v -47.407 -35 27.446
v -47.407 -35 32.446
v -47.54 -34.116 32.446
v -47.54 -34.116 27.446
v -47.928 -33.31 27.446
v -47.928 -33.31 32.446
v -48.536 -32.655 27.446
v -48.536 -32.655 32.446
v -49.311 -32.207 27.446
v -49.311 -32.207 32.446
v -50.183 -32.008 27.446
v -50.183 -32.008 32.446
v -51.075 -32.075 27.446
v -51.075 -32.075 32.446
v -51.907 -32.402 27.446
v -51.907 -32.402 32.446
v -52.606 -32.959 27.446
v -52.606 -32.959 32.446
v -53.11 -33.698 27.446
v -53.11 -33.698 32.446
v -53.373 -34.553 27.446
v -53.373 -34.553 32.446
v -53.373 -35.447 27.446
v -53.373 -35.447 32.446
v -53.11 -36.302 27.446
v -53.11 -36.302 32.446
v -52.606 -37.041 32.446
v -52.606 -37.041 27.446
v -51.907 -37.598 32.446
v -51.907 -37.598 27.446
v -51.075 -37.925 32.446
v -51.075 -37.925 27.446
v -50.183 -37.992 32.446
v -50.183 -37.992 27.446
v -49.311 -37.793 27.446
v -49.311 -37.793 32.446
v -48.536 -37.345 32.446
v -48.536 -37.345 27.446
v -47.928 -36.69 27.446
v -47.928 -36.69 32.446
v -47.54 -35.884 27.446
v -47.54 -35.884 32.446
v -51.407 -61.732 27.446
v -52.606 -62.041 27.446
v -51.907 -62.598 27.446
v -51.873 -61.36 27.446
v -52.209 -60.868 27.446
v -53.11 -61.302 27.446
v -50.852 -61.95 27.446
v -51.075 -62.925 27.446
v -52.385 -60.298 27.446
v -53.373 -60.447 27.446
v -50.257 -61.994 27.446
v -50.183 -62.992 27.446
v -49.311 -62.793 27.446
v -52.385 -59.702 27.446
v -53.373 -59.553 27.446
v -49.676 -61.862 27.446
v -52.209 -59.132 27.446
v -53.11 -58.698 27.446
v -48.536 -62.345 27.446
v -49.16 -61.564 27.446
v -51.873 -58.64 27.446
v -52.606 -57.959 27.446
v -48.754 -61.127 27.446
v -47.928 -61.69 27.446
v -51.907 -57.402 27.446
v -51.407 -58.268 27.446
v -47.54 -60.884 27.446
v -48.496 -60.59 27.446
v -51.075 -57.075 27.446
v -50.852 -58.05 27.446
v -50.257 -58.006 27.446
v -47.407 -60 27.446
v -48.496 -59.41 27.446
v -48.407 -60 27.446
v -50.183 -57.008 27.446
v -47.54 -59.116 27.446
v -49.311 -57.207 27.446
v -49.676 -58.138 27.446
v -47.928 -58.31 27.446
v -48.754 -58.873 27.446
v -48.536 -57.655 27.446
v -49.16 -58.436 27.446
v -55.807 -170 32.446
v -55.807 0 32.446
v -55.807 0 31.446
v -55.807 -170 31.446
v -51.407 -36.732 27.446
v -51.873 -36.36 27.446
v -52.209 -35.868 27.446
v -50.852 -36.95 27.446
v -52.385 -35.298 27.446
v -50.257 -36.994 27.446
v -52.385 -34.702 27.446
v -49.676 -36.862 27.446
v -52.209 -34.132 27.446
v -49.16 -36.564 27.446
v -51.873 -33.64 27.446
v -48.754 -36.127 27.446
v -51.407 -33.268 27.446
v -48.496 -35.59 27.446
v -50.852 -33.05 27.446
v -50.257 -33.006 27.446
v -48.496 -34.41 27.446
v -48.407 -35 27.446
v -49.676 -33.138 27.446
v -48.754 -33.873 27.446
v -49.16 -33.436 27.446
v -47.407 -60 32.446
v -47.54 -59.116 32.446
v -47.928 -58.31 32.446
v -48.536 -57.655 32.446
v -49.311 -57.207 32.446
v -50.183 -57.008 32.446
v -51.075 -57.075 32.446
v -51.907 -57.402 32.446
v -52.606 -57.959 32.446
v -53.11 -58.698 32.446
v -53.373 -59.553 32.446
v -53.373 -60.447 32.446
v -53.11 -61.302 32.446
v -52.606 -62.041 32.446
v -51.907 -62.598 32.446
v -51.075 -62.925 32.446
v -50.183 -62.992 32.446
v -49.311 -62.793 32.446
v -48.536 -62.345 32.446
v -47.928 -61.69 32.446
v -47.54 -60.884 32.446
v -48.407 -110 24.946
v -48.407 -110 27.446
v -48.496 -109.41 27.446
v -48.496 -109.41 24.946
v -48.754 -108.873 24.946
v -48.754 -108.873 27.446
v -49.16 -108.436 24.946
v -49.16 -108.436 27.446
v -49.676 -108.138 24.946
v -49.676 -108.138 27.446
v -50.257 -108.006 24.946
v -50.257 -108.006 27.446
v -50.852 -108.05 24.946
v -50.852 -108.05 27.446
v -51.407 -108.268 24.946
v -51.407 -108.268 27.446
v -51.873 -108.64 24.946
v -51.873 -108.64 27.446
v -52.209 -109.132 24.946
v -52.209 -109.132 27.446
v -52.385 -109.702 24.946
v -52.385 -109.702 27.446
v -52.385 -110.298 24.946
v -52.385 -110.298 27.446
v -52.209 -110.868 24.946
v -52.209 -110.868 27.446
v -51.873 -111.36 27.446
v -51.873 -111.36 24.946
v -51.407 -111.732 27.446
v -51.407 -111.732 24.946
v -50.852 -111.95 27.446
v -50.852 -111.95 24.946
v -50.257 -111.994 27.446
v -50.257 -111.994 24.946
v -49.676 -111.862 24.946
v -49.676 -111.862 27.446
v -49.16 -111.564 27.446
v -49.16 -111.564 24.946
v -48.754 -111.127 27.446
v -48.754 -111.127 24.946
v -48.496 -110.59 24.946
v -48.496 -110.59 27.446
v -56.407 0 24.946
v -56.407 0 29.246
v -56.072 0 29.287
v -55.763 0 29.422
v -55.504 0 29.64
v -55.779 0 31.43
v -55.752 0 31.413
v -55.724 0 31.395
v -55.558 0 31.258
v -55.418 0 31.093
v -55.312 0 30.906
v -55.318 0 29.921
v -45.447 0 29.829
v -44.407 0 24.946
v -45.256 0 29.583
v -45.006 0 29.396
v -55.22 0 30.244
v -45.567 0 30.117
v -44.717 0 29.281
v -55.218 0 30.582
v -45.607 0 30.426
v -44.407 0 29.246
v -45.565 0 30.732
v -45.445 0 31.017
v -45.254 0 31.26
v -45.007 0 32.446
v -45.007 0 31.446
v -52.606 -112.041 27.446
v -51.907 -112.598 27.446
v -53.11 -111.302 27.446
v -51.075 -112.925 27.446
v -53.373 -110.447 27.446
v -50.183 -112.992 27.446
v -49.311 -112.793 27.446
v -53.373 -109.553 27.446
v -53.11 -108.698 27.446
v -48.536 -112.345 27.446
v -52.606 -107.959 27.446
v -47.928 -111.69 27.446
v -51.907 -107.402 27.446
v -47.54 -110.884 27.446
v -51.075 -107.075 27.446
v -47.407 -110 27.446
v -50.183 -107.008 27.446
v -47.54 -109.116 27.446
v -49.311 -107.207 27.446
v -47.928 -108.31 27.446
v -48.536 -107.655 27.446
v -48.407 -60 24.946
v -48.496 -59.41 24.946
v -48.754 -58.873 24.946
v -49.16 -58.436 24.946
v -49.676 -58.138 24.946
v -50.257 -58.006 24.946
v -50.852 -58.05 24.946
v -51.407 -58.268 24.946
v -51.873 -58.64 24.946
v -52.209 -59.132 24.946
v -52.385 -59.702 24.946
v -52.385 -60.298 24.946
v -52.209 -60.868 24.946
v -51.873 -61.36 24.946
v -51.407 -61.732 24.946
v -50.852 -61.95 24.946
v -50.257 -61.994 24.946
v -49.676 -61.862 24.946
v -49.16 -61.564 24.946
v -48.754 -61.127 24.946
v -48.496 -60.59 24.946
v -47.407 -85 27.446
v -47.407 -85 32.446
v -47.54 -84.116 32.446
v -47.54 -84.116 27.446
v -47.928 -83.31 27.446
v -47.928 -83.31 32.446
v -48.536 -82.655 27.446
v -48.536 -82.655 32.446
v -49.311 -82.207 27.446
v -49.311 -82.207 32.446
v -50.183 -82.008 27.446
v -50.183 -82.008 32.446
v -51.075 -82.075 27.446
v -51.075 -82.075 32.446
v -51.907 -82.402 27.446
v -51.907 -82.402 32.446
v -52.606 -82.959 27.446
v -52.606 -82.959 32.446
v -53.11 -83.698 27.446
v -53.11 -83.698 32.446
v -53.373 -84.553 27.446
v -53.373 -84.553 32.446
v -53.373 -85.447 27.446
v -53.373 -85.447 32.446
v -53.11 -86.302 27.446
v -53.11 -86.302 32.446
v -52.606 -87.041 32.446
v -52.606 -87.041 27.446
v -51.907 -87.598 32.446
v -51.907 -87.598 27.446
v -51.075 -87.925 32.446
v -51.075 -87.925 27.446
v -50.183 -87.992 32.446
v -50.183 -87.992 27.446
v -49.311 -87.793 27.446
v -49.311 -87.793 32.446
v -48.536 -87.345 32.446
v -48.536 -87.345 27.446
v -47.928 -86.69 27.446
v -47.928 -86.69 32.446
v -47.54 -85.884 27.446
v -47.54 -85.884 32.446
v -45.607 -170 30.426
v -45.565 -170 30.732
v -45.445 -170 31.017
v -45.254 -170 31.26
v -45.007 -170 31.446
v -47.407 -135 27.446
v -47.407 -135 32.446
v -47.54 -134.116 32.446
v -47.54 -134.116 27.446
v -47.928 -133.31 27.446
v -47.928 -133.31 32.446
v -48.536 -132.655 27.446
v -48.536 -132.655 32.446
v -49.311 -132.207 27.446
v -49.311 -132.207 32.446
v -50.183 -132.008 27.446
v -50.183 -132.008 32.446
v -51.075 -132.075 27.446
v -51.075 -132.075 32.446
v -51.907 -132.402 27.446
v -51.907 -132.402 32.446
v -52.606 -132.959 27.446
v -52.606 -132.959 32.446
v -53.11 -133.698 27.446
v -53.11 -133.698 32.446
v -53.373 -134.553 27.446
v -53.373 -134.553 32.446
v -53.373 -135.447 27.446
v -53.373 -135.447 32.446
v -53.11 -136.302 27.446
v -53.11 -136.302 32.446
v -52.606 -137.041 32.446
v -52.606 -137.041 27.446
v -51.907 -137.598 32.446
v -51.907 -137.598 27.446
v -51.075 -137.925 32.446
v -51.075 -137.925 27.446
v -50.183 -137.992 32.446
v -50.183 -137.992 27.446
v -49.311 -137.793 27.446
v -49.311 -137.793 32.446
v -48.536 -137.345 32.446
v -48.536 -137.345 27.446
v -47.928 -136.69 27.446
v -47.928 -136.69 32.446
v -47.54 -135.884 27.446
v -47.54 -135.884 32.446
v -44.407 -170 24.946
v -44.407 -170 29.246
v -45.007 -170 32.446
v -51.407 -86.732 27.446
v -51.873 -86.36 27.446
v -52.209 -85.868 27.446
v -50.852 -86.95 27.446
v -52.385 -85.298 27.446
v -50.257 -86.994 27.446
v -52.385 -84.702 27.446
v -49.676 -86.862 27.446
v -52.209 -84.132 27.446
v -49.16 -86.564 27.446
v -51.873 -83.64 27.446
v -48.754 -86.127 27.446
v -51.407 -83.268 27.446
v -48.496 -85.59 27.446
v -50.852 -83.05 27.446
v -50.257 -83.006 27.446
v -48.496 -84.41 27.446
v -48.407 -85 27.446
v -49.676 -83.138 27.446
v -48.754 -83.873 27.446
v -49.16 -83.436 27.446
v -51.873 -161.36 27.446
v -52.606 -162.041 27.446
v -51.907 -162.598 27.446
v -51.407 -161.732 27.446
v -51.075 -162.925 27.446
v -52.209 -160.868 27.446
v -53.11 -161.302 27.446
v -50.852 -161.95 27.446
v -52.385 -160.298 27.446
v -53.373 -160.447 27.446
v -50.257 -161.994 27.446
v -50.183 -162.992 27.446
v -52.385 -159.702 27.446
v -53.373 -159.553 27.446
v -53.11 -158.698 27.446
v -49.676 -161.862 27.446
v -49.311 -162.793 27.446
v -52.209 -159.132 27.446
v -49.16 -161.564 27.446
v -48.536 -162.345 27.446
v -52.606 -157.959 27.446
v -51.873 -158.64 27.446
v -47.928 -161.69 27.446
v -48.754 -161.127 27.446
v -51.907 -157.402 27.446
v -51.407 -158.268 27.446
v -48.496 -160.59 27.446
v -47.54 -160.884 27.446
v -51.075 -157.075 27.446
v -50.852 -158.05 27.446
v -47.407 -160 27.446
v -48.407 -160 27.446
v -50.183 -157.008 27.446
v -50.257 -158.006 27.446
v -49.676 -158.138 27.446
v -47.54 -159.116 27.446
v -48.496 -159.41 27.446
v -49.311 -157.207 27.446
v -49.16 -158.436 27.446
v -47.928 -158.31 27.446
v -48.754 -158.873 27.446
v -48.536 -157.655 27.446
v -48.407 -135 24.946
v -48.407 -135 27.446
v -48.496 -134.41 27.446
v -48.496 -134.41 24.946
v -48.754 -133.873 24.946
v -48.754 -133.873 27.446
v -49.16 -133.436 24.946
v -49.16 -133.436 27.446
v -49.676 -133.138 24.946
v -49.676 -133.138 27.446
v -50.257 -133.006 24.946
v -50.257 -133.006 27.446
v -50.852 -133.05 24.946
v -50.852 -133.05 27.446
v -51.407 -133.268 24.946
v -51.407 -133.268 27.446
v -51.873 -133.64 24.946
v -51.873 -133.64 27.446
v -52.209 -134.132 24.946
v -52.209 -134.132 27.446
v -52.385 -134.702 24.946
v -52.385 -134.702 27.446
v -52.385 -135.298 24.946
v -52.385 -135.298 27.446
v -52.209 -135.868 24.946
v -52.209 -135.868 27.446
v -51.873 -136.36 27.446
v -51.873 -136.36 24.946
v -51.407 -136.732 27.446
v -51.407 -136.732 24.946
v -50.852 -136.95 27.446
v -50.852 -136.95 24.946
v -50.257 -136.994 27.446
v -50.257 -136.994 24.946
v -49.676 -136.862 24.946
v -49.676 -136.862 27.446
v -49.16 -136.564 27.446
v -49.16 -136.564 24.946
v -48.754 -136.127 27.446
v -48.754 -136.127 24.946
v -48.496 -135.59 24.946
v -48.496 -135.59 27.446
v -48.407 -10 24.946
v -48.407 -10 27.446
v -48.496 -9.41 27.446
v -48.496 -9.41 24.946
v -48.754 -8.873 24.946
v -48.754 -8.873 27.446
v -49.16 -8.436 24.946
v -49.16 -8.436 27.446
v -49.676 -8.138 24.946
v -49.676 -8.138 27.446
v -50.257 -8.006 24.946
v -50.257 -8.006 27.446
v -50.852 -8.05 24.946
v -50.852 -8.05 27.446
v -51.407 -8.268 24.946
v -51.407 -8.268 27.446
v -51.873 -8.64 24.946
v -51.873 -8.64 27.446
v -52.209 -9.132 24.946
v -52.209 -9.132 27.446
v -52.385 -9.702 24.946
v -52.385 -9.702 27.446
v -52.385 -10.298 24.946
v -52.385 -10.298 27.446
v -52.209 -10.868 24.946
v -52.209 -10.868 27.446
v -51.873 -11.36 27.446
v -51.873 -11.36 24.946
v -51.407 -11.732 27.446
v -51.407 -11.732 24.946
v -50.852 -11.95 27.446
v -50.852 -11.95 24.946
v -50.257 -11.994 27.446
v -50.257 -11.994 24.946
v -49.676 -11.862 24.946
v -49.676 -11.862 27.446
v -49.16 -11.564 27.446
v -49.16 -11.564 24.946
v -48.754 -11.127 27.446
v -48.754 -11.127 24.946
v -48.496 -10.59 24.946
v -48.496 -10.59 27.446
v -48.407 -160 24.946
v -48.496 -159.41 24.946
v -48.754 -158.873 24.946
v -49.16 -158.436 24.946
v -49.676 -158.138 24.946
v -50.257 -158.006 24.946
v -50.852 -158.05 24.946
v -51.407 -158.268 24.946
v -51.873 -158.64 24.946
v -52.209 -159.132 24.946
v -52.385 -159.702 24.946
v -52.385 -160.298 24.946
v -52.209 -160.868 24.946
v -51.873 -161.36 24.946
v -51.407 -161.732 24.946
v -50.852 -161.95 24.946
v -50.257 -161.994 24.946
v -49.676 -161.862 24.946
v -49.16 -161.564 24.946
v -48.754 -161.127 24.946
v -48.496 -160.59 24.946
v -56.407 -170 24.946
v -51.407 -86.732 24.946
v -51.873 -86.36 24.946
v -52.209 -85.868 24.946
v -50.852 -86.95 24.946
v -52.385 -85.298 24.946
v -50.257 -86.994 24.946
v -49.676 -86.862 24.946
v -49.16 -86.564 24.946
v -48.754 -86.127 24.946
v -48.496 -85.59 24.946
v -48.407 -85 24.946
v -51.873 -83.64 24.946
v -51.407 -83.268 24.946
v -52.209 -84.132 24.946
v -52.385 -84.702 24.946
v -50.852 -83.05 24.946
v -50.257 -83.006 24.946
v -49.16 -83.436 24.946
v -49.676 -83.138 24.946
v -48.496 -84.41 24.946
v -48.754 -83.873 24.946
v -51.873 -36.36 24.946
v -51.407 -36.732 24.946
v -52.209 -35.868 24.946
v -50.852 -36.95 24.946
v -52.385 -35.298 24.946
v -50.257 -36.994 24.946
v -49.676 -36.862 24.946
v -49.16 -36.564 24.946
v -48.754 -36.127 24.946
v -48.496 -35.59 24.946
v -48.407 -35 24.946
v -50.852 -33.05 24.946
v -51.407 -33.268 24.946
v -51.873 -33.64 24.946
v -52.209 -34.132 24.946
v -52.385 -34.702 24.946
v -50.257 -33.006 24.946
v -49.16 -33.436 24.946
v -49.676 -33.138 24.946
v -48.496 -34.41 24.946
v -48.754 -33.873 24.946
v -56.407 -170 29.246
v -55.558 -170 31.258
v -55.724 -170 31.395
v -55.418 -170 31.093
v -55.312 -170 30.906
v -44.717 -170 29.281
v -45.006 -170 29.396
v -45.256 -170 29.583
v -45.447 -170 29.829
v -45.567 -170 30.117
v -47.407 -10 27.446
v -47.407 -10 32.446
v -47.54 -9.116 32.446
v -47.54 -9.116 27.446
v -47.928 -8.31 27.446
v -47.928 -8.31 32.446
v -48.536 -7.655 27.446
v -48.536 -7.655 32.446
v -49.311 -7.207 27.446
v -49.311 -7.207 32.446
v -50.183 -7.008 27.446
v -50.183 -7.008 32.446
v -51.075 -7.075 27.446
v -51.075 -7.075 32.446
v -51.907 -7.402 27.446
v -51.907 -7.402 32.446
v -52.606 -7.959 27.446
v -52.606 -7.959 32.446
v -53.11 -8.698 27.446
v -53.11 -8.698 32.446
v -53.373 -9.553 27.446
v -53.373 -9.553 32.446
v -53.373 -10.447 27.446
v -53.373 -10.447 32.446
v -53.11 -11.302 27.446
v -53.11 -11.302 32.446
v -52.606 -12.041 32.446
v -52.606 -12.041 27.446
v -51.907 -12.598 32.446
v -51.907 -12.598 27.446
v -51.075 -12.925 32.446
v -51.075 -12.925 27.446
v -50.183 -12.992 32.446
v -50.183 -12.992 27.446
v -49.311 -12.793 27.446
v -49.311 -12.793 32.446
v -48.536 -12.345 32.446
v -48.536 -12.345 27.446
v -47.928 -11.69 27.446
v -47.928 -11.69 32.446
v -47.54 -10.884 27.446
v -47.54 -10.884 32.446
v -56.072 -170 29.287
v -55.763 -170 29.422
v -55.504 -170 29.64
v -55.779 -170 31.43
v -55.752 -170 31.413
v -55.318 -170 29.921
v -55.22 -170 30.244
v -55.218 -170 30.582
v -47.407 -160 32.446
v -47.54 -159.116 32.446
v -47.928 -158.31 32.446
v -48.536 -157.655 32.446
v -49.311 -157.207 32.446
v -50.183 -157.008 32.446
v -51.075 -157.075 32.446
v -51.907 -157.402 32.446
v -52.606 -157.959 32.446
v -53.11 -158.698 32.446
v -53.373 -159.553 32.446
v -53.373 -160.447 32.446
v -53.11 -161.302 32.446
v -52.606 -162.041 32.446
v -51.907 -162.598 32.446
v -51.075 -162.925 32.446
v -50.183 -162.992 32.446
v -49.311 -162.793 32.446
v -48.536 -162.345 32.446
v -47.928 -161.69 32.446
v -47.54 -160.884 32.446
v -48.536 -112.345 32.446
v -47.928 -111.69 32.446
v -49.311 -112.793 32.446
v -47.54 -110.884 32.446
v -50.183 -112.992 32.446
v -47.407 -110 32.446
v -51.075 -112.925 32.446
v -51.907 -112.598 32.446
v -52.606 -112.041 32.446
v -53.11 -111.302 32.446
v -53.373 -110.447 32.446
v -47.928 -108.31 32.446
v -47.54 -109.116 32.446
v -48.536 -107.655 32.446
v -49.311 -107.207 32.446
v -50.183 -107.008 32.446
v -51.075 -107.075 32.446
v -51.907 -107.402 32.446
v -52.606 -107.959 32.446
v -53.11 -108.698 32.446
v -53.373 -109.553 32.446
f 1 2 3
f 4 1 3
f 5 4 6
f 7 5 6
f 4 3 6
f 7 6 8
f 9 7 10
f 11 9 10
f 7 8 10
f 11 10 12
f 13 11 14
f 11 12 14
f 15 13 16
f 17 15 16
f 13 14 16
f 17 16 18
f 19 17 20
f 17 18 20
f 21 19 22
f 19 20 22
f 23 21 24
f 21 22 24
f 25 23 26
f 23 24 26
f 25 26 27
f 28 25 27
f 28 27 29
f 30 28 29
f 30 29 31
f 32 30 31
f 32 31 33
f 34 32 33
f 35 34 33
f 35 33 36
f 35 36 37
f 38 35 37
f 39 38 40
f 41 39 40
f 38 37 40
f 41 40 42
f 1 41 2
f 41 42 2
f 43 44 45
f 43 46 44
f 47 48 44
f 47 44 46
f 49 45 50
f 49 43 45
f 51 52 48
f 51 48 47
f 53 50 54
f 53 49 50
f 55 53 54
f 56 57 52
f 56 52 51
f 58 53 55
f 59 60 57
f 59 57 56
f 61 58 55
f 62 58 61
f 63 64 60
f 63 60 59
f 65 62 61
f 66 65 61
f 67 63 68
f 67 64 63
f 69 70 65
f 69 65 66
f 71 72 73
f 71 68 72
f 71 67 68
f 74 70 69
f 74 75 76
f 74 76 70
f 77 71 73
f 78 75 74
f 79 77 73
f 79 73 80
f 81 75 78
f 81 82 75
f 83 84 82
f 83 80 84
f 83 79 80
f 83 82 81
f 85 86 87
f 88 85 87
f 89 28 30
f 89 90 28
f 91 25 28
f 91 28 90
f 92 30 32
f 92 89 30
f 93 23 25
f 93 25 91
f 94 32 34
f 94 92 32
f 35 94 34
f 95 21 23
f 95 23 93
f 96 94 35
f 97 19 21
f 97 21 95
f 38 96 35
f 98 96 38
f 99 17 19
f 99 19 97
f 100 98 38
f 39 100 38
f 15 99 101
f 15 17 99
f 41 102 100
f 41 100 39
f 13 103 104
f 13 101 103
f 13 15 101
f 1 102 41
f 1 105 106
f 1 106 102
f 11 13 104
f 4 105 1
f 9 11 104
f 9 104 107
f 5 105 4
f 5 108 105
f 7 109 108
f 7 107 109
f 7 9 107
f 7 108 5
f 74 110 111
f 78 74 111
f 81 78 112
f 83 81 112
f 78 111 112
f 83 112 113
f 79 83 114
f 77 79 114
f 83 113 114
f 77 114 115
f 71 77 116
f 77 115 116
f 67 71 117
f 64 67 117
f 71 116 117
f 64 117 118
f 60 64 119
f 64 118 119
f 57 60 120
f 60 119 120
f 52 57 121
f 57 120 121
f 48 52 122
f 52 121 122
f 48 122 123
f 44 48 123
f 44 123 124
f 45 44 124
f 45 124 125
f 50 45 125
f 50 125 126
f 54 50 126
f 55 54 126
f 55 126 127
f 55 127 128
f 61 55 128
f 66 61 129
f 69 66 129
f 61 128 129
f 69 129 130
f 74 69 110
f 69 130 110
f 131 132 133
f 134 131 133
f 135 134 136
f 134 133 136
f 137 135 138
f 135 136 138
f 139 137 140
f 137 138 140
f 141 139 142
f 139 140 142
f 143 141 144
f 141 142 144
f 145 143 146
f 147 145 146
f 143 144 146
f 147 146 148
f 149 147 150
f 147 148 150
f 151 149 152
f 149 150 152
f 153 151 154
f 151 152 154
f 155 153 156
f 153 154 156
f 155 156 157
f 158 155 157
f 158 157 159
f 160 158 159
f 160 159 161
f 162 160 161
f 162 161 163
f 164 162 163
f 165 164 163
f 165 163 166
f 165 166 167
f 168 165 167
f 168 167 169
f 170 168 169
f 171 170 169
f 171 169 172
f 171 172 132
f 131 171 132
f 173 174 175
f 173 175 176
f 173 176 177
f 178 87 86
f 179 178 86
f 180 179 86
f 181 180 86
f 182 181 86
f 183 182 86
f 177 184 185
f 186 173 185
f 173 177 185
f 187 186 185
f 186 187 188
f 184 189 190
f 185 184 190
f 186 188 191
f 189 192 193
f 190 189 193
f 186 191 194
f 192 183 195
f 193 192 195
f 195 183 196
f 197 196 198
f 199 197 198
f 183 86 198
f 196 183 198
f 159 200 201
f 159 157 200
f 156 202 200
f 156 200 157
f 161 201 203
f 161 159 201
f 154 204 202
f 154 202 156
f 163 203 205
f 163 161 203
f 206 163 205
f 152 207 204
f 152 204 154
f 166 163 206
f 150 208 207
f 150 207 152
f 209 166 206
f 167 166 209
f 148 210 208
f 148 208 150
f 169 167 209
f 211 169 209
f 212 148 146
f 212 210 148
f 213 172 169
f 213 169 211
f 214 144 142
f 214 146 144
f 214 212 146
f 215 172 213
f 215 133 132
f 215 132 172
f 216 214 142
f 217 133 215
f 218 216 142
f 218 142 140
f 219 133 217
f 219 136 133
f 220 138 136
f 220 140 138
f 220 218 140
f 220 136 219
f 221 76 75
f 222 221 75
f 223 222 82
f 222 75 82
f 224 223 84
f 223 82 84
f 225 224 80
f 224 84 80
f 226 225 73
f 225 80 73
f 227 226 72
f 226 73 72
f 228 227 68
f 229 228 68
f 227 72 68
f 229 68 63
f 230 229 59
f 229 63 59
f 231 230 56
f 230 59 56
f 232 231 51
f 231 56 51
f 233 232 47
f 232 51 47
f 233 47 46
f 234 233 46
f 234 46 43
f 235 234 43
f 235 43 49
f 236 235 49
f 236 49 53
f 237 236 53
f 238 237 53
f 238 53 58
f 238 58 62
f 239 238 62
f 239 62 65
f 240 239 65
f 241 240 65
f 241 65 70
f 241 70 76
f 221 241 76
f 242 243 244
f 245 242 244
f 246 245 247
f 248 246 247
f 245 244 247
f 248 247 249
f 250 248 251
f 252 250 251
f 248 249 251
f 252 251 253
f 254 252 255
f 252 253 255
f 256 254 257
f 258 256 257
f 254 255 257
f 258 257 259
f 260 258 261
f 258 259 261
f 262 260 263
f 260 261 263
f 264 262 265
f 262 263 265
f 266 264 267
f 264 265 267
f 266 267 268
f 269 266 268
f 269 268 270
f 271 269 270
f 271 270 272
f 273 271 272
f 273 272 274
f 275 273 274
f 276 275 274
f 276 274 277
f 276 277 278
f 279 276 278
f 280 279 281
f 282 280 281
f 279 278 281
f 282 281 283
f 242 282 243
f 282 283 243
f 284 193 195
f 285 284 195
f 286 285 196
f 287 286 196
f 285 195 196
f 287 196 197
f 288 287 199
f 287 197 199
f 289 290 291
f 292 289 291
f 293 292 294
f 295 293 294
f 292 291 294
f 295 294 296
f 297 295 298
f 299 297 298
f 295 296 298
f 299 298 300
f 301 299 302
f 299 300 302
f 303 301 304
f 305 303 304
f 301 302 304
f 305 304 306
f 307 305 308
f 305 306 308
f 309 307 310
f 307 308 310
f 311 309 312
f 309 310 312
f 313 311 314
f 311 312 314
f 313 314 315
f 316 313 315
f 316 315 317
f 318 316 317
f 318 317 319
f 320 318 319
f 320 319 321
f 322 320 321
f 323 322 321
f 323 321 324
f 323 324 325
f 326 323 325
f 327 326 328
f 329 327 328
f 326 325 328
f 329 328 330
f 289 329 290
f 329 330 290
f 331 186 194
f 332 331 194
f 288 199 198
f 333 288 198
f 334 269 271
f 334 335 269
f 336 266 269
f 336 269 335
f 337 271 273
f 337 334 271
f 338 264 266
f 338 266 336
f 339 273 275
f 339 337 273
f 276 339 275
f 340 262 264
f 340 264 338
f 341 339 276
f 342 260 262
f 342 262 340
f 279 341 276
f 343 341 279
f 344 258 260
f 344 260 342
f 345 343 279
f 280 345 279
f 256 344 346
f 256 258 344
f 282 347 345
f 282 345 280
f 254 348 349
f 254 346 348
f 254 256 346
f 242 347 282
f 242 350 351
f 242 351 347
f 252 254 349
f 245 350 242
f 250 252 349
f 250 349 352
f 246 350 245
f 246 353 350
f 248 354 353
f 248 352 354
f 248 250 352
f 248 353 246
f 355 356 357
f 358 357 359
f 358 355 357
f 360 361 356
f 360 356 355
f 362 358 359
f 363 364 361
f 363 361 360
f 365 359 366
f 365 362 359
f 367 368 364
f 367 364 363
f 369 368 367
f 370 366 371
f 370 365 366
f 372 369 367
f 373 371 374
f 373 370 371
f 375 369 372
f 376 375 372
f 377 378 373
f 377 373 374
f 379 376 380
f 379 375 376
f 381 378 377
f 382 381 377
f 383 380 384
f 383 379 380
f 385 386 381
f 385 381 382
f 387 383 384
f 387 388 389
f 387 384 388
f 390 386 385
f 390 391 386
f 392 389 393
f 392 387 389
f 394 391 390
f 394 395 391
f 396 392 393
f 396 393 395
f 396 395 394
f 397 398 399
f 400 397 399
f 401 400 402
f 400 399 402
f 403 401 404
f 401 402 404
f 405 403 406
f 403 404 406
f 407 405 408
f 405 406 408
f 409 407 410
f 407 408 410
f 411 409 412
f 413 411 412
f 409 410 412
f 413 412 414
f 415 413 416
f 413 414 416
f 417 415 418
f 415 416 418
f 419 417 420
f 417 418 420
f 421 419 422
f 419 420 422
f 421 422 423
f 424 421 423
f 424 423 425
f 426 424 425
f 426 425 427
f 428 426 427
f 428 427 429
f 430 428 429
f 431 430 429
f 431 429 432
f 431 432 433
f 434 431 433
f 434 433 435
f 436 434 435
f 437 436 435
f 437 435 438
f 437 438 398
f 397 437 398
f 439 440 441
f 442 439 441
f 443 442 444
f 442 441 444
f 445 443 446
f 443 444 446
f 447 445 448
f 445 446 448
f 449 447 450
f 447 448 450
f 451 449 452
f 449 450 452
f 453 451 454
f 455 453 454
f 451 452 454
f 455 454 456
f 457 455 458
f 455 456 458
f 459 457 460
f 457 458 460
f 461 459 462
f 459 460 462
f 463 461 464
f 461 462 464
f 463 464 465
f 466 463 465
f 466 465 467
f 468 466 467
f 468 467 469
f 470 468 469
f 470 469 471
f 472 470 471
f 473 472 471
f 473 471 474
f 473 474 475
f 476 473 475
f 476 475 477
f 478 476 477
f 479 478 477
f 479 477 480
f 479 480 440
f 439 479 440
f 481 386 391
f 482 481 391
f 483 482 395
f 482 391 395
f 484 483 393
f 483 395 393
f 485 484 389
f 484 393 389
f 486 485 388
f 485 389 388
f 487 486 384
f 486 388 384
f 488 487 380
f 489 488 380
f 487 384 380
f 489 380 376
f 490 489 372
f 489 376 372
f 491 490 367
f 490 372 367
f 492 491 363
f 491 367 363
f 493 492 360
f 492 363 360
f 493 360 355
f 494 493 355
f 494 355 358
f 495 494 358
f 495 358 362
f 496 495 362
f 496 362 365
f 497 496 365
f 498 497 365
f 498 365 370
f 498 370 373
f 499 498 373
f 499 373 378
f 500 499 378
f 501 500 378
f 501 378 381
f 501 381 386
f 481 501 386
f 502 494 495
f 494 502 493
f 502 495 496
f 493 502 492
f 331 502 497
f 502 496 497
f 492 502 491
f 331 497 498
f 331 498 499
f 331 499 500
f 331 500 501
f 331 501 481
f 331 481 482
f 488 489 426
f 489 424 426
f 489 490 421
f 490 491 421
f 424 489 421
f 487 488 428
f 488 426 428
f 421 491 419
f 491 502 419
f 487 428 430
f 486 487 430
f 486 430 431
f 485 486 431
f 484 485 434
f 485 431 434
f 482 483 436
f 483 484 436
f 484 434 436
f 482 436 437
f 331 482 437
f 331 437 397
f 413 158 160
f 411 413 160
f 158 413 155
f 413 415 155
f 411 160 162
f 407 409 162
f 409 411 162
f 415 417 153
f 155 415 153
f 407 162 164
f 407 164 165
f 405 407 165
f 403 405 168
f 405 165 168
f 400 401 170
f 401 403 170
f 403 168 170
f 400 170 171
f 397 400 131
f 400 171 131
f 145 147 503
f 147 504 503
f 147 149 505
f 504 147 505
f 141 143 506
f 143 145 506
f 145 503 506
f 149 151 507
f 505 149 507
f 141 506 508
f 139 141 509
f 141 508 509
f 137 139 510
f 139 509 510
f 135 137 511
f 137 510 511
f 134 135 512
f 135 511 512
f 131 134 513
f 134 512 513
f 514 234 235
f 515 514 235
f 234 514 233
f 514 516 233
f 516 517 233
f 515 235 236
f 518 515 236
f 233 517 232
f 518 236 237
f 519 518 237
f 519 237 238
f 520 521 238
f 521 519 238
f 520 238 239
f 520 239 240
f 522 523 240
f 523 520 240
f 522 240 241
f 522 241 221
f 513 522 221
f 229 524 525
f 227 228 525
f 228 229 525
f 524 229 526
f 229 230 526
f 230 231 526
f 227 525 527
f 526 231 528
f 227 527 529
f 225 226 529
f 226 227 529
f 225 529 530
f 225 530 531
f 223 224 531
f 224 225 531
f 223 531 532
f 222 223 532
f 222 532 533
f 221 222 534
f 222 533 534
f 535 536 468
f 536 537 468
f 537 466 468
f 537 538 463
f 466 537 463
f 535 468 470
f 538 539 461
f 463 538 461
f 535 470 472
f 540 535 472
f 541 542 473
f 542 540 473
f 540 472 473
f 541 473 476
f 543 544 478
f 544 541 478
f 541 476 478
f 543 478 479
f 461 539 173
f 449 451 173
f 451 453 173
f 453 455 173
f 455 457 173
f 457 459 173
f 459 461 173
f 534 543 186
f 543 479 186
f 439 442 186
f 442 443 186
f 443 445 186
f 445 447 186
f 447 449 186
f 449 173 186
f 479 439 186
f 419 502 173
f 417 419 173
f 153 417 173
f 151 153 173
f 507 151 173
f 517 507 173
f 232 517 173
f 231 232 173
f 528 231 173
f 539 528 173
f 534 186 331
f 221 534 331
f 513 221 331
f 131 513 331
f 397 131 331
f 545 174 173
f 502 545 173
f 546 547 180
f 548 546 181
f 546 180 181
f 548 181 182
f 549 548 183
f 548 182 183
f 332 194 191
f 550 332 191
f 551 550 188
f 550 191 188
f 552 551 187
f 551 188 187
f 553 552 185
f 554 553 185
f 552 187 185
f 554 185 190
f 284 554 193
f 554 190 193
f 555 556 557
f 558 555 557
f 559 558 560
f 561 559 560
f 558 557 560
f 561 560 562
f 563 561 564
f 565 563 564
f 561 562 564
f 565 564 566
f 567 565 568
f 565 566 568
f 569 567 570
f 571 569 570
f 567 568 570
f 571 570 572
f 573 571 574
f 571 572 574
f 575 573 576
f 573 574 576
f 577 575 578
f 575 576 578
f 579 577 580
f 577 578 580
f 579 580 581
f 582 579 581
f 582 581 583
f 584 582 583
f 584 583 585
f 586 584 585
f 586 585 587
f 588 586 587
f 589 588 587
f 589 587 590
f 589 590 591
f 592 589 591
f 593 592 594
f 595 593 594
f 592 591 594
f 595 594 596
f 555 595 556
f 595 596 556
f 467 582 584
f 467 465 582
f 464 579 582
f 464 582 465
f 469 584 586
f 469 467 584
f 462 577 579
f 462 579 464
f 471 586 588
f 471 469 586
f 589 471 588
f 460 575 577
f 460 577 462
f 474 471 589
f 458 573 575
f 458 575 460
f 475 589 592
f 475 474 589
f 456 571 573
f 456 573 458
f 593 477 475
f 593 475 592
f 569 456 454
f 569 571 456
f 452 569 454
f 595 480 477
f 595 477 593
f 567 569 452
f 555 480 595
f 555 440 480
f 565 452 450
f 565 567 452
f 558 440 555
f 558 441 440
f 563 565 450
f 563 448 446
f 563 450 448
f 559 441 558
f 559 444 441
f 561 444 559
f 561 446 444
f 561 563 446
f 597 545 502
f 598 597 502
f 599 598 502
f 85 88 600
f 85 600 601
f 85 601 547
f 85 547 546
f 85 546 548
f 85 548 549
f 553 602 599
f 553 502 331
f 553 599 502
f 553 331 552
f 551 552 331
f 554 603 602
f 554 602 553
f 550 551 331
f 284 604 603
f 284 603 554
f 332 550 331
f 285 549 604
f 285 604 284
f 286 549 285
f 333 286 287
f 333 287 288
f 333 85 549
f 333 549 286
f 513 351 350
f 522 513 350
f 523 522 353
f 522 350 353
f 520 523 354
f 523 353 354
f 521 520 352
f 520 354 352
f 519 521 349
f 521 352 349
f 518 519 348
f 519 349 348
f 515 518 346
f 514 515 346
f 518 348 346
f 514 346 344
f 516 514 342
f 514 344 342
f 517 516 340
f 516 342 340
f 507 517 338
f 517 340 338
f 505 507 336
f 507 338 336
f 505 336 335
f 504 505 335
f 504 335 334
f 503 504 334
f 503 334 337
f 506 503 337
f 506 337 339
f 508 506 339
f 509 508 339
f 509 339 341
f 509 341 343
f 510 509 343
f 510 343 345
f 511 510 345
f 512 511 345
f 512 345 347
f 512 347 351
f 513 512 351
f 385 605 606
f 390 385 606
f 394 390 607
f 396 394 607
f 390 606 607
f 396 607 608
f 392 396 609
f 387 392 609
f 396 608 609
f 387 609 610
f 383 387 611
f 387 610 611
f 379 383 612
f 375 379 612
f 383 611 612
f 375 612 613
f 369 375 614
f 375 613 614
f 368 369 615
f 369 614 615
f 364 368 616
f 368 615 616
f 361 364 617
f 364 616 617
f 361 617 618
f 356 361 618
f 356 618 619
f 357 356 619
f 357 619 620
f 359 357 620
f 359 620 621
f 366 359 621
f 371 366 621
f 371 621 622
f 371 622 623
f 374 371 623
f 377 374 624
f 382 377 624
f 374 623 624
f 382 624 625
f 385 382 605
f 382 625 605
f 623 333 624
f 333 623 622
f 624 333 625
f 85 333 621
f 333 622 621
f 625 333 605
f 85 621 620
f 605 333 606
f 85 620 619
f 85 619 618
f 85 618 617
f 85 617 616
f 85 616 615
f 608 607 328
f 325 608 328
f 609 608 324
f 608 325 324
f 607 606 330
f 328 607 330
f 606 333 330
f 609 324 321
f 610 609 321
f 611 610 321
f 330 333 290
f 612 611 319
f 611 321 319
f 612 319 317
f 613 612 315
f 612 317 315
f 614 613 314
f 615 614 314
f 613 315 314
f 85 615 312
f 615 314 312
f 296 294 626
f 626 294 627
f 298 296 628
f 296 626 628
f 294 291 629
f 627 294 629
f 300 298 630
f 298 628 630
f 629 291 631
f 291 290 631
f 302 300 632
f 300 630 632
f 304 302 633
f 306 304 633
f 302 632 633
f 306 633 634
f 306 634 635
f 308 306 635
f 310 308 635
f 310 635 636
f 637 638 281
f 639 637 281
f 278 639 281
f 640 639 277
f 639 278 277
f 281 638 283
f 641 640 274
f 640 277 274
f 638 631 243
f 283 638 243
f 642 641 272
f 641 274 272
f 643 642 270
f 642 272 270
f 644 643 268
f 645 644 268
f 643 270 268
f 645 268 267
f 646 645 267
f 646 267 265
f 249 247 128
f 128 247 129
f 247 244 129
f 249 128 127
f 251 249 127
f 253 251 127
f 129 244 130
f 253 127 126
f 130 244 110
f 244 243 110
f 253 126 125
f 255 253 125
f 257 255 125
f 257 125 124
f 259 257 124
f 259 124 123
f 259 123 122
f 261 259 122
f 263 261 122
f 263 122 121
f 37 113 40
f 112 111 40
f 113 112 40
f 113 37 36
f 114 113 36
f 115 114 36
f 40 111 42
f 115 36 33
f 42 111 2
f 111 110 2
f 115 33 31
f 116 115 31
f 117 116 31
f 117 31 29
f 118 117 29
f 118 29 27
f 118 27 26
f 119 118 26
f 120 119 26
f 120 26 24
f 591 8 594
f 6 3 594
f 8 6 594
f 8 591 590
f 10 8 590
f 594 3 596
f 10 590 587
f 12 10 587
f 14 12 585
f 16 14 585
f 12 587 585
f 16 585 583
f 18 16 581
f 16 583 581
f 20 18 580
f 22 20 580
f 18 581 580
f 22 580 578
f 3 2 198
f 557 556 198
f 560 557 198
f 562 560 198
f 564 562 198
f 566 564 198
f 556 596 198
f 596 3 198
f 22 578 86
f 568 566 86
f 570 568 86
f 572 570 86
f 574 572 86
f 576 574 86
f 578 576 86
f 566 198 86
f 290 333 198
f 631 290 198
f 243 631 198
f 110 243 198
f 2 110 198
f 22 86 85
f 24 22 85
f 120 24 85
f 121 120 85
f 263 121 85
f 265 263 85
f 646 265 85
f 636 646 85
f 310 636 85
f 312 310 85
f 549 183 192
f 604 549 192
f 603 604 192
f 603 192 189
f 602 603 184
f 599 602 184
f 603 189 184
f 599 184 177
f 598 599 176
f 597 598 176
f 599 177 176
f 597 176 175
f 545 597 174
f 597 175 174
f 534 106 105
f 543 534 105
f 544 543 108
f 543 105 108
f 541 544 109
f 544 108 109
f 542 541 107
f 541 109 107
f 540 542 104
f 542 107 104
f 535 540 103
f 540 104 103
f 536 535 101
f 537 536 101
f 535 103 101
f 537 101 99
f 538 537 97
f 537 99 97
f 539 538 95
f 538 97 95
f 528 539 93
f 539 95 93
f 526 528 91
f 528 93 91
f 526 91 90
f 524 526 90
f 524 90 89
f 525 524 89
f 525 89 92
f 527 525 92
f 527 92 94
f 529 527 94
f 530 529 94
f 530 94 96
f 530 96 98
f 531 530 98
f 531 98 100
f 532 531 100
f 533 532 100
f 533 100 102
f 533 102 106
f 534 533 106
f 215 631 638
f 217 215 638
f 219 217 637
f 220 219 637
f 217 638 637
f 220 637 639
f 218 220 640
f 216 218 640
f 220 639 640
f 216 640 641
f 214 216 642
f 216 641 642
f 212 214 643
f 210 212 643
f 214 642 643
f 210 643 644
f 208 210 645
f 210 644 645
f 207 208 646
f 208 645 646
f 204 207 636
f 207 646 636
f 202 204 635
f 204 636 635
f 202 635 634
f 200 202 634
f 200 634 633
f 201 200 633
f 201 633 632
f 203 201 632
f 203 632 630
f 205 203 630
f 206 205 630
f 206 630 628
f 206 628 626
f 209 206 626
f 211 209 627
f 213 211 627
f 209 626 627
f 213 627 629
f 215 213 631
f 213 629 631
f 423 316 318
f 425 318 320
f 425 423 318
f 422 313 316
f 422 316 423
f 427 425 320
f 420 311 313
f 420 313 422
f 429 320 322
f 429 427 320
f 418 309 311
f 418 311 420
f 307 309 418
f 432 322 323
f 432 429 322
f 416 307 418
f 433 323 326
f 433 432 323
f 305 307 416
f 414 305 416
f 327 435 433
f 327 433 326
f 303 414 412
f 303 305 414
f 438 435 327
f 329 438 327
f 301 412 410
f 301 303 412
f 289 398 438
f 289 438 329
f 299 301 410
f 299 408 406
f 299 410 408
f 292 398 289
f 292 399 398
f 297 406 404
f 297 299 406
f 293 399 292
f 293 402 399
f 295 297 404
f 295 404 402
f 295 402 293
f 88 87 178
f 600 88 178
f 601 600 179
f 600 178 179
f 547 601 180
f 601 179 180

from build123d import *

# Parameters (mm, degrees)
F1_DEPTH = 170
F2_R     = 3
F2_R_2   = 2
F3_DEPTH = 5
F4_DEPTH = 7.501


with BuildPart() as f1:
    # F0 (on Front) → F1 (new body)
    with BuildSketch(Plane.XZ):
        with BuildLine():
            Line((-45.006957, 32.445839), (-55.806957, 32.445839))
            Line((-55.806957, 32.445839), (-55.806957, 31.445839))
            ThreePointArc((-55.806957, 31.445839), (-55.765201, 31.421253), (-55.724493, 31.394966))
            Line((-55.724493, 31.394966), (-55.206957, 31.075689))
            Line((-55.206957, 31.075689), (-55.311685, 30.905929))
            ThreePointArc((-55.311685, 30.905929), (-55.401245, 29.77366), (-56.406957, 29.245839))
            Line((-56.406957, 29.245839), (-56.406957, 24.945839))
            Line((-56.406957, 24.945839), (-44.406957, 24.945839))
            Line((-44.406957, 24.945839), (-44.406957, 29.245839))
            ThreePointArc((-44.406957, 29.245839), (-45.255625, 29.582815), (-45.606948, 30.425645))
            ThreePointArc((-45.606948, 30.425645), (-45.444735, 31.016774), (-45.006957, 31.445839))
            Line((-45.006957, 31.445839), (-45.006957, 32.445839))
        make_face()
        with BuildLine():
            ThreePointArc((-55.724493, 31.394966), (-55.484164, 31.179085), (-55.311685, 30.905929))
            Line((-55.311685, 30.905929), (-55.206957, 31.075689))
            Line((-55.206957, 31.075689), (-55.724493, 31.394966))
        make_face()
    extrude(amount=F1_DEPTH)

    # F2 (on face) → F3 (cut)
    with BuildSketch(Plane.XY.offset(32.445839)):
        with Locations((-50.406957, -160)):
            Circle(F2_R)
        with Locations((-50.406957, -160)):
            Circle(F2_R_2, mode=Mode.SUBTRACT)
        with Locations((-50.406957, -135)):
            Circle(F2_R)
        with Locations((-50.406957, -135)):
            Circle(F2_R_2, mode=Mode.SUBTRACT)
        with Locations((-50.406957, -110)):
            Circle(F2_R)
        with Locations((-50.406957, -110)):
            Circle(F2_R_2, mode=Mode.SUBTRACT)
        with Locations((-50.406957, -85)):
            Circle(F2_R)
        with Locations((-50.406957, -85)):
            Circle(F2_R_2, mode=Mode.SUBTRACT)
        with Locations((-50.406957, -60)):
            Circle(F2_R)
        with Locations((-50.406957, -60)):
            Circle(F2_R_2, mode=Mode.SUBTRACT)
        with Locations((-50.406957, -35)):
            Circle(F2_R)
        with Locations((-50.406957, -35)):
            Circle(F2_R_2, mode=Mode.SUBTRACT)
        with Locations((-50.406957, -10)):
            Circle(F2_R)
        with Locations((-50.406957, -10)):
            Circle(F2_R_2, mode=Mode.SUBTRACT)
    extrude(amount=-F3_DEPTH, mode=Mode.SUBTRACT)

    # F2 (on face) → F4 (cut, through all)
    with BuildSketch(Plane.XY.offset(32.445839)):
        with Locations((-50.406957, -160)):
            Circle(F2_R_2)
        with Locations((-50.406957, -135)):
            Circle(F2_R_2)
        with Locations((-50.406957, -110)):
            Circle(F2_R_2)
        with Locations((-50.406957, -85)):
            Circle(F2_R_2)
        with Locations((-50.406957, -60)):
            Circle(F2_R_2)
        with Locations((-50.406957, -35)):
            Circle(F2_R_2)
        with Locations((-50.406957, -10)):
            Circle(F2_R_2)
    extrude(amount=-F4_DEPTH, mode=Mode.SUBTRACT)


solid = f1.part
